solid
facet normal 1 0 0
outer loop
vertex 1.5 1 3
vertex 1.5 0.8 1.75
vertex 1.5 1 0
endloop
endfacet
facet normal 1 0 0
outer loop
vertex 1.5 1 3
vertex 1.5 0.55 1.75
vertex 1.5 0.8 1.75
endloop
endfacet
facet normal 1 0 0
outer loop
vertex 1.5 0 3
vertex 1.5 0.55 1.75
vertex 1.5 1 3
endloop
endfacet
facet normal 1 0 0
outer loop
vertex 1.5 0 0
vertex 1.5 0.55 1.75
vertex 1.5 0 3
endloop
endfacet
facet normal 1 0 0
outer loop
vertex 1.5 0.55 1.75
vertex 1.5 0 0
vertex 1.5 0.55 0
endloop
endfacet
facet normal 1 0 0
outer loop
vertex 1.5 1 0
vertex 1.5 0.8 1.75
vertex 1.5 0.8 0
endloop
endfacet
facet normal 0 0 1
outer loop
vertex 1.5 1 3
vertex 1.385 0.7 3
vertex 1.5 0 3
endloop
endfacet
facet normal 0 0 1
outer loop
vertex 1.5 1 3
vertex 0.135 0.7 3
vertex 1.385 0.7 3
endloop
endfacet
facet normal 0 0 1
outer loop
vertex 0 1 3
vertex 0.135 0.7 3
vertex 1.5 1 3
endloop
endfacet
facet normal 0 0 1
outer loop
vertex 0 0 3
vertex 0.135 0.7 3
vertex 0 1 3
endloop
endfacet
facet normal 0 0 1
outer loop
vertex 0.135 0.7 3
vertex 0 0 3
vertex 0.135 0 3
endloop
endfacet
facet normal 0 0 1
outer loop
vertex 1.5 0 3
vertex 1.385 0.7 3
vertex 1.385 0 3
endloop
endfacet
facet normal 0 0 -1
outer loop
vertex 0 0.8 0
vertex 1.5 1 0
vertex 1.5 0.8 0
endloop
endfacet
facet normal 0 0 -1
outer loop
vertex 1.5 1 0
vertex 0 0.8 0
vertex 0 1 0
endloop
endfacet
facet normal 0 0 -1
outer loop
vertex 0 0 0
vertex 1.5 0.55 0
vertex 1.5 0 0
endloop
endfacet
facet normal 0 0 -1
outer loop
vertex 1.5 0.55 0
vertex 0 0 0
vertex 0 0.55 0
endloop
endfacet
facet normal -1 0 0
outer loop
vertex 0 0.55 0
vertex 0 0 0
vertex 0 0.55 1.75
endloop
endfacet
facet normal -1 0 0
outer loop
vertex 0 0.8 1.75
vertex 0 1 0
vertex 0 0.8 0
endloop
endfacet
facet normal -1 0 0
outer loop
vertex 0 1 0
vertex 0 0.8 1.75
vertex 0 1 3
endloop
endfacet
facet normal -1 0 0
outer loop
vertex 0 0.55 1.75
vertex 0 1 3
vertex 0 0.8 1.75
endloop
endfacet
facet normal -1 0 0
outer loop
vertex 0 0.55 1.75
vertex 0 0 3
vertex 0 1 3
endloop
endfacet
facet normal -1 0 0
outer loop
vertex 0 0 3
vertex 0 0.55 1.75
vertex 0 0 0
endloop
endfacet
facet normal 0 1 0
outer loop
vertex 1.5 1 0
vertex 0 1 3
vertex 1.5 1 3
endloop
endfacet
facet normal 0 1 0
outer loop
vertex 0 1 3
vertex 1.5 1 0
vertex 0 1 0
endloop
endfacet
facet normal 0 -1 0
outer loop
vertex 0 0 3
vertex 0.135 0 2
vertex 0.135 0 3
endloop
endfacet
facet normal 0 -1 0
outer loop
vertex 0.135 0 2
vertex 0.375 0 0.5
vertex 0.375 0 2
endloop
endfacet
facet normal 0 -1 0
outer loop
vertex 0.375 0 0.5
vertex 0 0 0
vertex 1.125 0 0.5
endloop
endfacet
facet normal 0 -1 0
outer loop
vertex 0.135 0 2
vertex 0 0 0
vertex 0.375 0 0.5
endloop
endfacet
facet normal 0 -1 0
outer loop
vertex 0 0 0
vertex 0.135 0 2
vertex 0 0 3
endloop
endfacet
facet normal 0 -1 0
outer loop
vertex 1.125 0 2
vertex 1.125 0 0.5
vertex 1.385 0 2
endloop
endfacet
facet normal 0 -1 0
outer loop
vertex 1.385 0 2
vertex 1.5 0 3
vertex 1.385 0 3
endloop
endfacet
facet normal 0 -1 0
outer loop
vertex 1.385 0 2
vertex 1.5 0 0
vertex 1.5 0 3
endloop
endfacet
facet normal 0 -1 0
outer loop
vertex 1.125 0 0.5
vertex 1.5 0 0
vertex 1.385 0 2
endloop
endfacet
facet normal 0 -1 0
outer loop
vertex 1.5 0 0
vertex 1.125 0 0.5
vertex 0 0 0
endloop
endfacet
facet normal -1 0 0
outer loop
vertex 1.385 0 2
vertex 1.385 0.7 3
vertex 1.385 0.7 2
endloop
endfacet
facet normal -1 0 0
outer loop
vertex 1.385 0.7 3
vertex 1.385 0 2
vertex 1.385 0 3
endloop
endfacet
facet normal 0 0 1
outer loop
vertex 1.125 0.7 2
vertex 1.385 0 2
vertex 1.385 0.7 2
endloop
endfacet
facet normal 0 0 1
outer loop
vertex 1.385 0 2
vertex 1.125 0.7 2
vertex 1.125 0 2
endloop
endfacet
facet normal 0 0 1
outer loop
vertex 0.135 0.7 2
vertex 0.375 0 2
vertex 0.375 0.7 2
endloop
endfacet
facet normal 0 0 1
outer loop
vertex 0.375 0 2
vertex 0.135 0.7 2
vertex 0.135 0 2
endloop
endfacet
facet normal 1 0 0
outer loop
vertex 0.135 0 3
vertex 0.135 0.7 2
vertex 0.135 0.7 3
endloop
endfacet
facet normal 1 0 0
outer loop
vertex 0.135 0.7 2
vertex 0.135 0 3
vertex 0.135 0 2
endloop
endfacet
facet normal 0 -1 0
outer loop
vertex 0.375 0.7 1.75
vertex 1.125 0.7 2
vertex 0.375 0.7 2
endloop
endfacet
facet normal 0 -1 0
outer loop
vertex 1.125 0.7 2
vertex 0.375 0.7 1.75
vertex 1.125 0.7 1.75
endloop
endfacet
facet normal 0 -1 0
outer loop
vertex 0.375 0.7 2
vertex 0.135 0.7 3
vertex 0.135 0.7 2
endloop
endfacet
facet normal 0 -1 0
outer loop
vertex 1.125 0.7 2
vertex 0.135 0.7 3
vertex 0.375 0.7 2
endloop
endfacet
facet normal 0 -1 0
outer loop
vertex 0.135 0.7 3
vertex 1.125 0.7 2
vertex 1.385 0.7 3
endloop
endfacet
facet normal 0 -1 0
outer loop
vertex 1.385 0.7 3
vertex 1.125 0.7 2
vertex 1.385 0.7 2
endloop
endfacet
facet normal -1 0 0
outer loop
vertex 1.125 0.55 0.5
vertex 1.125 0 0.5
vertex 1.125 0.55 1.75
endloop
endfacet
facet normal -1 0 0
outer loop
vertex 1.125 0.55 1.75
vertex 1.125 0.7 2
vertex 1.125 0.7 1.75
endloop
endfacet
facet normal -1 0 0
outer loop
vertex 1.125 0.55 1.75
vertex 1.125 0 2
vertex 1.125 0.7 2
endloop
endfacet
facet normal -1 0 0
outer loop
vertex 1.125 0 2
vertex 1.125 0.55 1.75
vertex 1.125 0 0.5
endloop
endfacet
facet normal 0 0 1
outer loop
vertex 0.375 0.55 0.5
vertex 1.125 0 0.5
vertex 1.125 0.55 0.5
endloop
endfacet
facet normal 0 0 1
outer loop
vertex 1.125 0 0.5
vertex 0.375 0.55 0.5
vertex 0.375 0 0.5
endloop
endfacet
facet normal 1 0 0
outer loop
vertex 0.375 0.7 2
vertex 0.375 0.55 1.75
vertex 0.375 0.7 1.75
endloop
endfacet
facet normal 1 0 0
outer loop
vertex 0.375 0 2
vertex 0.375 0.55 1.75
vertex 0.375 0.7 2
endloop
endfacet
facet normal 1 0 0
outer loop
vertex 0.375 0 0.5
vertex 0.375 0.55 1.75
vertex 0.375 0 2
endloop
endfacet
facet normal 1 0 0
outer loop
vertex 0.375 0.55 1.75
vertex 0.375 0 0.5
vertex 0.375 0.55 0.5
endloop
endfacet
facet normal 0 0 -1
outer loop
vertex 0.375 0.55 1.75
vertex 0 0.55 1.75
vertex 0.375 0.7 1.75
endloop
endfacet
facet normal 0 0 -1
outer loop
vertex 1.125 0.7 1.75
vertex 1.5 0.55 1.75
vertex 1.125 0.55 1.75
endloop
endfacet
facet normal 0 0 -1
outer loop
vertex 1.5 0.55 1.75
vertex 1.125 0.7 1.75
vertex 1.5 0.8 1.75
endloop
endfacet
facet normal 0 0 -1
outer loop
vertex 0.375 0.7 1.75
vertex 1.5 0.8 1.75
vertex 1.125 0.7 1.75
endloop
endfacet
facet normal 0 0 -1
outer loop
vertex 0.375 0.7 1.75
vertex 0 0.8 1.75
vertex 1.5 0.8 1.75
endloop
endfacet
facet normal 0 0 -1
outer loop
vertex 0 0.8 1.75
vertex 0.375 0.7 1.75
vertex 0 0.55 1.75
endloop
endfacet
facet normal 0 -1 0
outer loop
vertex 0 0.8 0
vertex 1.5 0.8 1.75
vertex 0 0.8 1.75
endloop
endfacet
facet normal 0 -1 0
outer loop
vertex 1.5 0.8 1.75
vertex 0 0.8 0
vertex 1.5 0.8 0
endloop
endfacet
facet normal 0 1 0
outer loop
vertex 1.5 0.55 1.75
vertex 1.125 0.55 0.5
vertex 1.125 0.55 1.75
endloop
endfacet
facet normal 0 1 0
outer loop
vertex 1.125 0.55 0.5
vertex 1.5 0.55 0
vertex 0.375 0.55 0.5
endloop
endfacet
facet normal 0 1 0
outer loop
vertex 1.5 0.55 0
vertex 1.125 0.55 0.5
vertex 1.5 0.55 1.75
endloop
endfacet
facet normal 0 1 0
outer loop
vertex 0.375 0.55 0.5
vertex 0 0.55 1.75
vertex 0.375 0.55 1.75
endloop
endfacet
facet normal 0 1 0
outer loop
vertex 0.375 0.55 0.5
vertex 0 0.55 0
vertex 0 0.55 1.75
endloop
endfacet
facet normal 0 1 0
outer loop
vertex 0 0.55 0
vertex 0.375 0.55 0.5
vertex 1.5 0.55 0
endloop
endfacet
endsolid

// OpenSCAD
difference(){
    cube([1.5,1,3]);
    translate([.135,0,2])cube([1.25,.7,2]);
    translate([.375,0,0.5])cube([.75,.7,1.5]);
    translate([0,0.55,0])cube([1.5,0.25,1.75]);
}
